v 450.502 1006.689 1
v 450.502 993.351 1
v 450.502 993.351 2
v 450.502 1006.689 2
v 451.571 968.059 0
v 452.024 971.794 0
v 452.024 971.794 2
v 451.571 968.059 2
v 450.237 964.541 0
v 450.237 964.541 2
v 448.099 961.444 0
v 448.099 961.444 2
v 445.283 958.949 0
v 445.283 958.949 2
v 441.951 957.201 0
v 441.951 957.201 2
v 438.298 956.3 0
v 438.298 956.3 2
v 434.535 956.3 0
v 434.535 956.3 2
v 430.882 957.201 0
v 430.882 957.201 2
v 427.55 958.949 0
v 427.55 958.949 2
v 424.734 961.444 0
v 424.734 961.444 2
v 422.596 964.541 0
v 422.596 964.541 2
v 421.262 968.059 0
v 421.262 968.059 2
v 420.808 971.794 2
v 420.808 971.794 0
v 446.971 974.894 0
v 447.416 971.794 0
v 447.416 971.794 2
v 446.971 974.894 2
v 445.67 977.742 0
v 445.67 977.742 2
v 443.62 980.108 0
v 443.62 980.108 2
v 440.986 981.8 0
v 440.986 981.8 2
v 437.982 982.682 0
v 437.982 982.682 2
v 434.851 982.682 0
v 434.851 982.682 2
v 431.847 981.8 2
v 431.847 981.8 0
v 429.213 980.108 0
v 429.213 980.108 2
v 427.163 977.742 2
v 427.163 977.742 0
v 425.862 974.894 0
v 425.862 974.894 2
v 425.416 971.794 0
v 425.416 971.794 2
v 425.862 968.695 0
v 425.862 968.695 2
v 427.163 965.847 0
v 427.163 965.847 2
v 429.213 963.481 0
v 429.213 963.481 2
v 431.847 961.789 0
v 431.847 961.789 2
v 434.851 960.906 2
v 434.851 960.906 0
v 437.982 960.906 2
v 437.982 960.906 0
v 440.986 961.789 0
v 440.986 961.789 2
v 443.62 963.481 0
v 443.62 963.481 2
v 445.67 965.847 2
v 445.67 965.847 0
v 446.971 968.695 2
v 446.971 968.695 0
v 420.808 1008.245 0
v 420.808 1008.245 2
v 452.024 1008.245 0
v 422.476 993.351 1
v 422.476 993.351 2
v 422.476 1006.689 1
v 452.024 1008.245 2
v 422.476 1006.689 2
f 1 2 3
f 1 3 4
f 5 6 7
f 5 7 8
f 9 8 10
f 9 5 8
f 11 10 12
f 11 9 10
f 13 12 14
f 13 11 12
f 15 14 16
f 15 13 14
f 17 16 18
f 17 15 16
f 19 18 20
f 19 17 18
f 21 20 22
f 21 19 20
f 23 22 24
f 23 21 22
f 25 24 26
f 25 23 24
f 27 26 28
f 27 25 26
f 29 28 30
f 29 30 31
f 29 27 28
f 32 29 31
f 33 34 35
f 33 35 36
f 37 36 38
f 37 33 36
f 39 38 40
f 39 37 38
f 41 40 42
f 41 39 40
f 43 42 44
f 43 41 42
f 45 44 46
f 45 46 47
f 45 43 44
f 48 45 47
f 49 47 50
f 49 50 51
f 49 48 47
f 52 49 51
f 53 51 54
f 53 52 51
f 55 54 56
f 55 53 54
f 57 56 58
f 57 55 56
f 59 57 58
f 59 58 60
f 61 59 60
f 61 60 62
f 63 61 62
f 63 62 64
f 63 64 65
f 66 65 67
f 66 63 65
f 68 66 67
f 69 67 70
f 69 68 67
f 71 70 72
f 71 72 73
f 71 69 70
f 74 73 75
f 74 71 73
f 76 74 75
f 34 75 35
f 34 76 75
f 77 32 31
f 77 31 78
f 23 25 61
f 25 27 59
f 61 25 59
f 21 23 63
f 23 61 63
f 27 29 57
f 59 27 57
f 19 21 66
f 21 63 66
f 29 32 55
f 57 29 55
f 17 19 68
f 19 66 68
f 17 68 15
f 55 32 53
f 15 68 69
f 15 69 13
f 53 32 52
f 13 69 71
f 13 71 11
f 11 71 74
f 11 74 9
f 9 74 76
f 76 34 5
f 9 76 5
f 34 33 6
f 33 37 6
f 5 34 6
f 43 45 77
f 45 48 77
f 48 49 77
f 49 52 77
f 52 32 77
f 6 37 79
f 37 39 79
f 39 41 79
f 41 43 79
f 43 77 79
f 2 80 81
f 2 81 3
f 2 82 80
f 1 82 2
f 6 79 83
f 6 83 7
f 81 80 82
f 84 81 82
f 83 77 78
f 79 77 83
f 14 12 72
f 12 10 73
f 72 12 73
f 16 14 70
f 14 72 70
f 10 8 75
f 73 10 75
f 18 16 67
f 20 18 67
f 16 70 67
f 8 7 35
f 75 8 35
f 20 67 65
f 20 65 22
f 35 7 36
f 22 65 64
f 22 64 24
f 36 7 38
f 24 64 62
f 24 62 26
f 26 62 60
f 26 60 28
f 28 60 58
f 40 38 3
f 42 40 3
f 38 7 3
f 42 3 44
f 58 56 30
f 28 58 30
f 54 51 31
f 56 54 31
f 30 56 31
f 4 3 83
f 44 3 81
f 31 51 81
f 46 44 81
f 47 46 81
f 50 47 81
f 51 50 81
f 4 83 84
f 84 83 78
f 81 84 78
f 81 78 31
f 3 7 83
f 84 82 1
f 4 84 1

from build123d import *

# Parameters (mm, degrees)
SKETCH1_R           = 11
SKETCH1_W           = 28.025444105
SKETCH1_H           = 13.338271477
BOSS_EXTRUDE1_DEPTH = 2
SKETCH2_W           = 28.025444105
SKETCH2_H           = 13.338271477
BOSS_EXTRUDE2_DEPTH = 1


with BuildPart() as part:
    # Sketch1 → Boss-Extrude1 (new body)
    with BuildSketch(Plane.XY):
        with BuildLine():
            Line((420.808310711, 971.794452341), (420.808310711, 1008.244630448))
            Line((420.808310711, 1008.244630448), (452.024309123, 1008.244630448))
            Line((452.024309123, 1008.244630448), (452.024309123, 971.794452341))
            ThreePointArc((452.024309123, 971.794452341), (436.416309917, 956.186453136), (420.808310711, 971.794452341))
        make_face()
        with Locations((436.416309917, 971.794452341)):
            Circle(SKETCH1_R, mode=Mode.SUBTRACT)
        with Locations((436.489180342, 1000.019726734)):
            Rectangle(SKETCH1_W, SKETCH1_H, mode=Mode.SUBTRACT)
    extrude(amount=BOSS_EXTRUDE1_DEPTH)

    # Sketch2 → Boss-Extrude2 (add)
    with BuildSketch(Plane.XY):
        with Locations((436.489180342, 1000.019726734)):
            Rectangle(SKETCH2_W, SKETCH2_H)
    extrude(amount=BOSS_EXTRUDE2_DEPTH)


solid = part.part
